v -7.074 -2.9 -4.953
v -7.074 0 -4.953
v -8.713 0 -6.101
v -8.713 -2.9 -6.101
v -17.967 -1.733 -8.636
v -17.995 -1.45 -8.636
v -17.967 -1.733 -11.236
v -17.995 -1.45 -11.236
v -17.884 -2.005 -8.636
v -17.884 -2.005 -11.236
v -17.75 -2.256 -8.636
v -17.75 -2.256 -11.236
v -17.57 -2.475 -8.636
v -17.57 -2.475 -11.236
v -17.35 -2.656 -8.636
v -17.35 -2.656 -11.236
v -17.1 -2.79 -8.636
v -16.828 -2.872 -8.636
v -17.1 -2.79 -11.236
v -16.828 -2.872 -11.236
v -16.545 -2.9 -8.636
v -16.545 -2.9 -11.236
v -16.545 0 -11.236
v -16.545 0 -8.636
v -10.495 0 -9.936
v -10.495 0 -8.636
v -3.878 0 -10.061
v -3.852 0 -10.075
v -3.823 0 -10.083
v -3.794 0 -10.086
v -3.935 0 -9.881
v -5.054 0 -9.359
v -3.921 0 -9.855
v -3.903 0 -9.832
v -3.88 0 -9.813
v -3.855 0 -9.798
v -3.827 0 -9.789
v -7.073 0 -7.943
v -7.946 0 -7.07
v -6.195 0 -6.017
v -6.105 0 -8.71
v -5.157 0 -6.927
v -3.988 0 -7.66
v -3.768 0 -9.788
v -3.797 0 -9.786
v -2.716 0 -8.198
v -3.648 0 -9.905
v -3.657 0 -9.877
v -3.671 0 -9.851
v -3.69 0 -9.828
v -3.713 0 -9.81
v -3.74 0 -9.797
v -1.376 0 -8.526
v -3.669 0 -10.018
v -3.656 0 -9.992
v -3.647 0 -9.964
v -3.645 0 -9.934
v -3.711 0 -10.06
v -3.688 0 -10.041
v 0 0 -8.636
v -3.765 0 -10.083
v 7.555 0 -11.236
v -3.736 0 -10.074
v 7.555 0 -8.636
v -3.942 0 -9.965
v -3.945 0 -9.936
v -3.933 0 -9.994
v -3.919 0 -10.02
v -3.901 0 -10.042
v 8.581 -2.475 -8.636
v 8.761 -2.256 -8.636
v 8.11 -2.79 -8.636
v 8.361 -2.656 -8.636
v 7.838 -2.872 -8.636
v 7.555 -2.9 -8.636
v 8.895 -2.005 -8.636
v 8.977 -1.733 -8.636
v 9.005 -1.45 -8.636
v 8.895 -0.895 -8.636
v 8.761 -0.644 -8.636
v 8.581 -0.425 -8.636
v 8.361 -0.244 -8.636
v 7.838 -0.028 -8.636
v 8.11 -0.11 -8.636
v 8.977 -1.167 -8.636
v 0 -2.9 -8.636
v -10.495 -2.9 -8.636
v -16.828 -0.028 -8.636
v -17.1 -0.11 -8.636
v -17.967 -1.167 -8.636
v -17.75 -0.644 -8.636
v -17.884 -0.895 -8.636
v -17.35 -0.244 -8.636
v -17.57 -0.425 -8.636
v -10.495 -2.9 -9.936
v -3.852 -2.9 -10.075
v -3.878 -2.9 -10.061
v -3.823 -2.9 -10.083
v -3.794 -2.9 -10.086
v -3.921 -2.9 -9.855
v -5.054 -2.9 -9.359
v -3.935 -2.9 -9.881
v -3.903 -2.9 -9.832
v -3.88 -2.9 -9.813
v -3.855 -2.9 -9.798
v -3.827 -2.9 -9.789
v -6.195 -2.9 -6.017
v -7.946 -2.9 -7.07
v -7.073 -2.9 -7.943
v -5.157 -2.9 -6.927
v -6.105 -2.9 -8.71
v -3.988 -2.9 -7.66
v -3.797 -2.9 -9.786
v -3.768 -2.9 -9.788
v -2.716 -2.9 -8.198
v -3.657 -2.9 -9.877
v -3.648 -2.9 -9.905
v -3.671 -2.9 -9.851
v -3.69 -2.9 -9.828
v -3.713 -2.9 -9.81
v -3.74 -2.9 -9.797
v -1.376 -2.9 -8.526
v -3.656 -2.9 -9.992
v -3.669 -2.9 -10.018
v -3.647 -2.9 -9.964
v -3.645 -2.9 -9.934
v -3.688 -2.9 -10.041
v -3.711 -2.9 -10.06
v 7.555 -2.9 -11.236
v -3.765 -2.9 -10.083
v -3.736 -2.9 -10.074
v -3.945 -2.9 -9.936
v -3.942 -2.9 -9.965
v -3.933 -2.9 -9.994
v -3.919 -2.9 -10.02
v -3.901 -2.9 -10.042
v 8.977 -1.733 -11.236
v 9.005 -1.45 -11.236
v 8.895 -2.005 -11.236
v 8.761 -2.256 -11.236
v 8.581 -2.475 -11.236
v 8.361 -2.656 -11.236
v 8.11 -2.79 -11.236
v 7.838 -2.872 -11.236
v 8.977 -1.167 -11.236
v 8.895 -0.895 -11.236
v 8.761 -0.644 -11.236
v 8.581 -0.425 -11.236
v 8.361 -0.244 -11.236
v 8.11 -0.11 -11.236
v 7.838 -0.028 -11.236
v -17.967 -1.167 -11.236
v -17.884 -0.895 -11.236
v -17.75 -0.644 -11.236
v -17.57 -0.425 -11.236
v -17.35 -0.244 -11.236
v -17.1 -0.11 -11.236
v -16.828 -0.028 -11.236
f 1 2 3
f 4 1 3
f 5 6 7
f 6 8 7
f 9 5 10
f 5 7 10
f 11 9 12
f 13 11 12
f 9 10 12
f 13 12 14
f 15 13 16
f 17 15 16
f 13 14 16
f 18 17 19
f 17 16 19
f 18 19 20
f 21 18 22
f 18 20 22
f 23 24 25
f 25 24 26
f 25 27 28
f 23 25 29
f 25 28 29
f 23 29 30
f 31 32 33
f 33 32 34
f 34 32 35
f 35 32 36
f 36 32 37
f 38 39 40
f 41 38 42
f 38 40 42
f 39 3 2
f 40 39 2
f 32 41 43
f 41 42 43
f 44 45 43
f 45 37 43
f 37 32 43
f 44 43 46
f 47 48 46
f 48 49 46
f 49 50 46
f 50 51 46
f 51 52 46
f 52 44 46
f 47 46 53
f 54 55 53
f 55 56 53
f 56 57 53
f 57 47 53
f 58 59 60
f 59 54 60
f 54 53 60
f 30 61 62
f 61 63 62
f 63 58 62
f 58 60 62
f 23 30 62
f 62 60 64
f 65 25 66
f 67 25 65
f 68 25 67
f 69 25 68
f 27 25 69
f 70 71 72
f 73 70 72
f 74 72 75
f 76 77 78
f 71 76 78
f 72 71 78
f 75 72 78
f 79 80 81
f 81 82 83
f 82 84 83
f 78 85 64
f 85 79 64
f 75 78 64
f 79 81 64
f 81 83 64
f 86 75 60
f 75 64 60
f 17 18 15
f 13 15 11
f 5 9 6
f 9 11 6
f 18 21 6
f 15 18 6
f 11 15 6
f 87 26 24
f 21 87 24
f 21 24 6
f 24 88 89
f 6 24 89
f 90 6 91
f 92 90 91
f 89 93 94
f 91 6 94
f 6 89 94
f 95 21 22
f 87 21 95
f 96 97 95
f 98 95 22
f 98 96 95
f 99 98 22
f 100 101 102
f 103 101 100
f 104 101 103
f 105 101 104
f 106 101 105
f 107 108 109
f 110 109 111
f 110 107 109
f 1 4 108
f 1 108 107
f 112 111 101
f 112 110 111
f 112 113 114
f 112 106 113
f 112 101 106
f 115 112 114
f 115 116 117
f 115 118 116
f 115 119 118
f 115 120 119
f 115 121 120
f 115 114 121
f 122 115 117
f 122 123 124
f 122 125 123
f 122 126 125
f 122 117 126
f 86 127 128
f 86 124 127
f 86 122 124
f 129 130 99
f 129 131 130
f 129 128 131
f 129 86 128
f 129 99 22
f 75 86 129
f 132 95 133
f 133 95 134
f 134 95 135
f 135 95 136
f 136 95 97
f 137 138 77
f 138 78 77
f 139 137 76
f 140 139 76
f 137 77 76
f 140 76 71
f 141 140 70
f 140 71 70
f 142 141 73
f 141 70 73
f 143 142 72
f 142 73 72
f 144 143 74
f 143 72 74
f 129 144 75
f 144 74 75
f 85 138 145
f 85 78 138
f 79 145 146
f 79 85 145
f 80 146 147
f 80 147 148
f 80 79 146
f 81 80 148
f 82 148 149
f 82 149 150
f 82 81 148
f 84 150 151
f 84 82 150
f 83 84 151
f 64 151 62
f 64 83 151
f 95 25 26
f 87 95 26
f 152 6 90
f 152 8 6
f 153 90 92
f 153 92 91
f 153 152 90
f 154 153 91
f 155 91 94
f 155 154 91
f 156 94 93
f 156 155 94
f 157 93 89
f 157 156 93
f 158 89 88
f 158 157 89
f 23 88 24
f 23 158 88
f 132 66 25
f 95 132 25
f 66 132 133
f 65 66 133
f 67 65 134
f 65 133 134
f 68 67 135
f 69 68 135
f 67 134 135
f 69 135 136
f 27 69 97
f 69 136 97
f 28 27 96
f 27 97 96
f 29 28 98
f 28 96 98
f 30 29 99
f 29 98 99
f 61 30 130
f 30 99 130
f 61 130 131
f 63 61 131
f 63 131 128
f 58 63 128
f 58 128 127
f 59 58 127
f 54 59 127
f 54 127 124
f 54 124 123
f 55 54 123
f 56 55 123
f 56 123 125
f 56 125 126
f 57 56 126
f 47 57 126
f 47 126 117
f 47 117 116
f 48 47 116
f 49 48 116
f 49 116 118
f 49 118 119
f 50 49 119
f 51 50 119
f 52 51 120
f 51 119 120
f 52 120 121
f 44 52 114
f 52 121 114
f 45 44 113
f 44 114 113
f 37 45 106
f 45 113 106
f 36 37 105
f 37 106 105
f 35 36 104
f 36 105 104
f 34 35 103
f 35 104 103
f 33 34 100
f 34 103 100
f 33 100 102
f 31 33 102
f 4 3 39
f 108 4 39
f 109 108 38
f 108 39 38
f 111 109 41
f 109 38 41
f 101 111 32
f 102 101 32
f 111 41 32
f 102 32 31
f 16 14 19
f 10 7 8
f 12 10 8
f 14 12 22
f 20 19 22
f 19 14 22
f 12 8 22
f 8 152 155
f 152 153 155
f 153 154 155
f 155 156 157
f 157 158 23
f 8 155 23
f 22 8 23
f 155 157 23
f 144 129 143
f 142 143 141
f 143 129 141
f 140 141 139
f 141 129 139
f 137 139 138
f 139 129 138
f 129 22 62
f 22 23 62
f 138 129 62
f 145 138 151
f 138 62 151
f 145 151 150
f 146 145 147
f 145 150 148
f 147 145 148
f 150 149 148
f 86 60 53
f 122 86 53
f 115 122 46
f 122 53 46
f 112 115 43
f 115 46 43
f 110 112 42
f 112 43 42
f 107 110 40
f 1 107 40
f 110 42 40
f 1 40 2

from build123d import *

# Parameters (mm, degrees)
F2_DEPTH = 2.9
F3_R     = 1.44999
F4_D     = 0.3


# Not quite as in the source:
# - a fillet or chamfer is up to 0.001 mm smaller than in the source, because OpenCascade refuses the exact size


with BuildPart() as f2:
    # F0 (on Front) → F2 (new body)
    with BuildSketch(Plane.XZ):
        Polygon((9.0052141035, -8.636), (0, -8.636), (0, -9.936), (-3.7947858965, -9.936), (-10.4947858965, -9.936), (-10.4947858965, -8.636), (-17.9947858965, -8.636), (-17.9947858965, -11.236), (9.0052141035, -11.236), align=None)
        with BuildLine():
            Line((0, -9.936), (0, -8.636))
            ThreePointArc((0, -8.636), (-3.9876610239, -7.6602255553), (-7.0741970545, -4.9534061043))
            Line((-7.0741970545, -4.9534061043), (-8.7125011431, -6.100558977))
            ThreePointArc((-8.7125011431, -6.100558977), (-6.5410785986, -8.3868222091), (-3.7947858965, -9.936))
            Line((-3.7947858965, -9.936), (0, -9.936))
        make_face()
    extrude(amount=F2_DEPTH)

    # F3 (radius 1.45 in the source; OpenCascade refuses exactly that, so slightly less here)
    f3_edges = [f2.edges().sort_by_distance(p)[0] for p in [
        (9.005214, -2.9, -9.936),
        (9.005214, 0, -9.936),
        (-17.994786, -2.9, -9.936),
        (-17.994786, 0, -9.936),
    ]]
    fillet(f3_edges, radius=F3_R)

    # F4 (through all)
    with Locations(Plane(origin=(0, 0, 0), x_dir=(1, 0, 0), z_dir=(0, 1, 0))):
        with Locations((-3.7947858965, 9.936)):
            Hole(F4_D / 2)


solid = f2.part
